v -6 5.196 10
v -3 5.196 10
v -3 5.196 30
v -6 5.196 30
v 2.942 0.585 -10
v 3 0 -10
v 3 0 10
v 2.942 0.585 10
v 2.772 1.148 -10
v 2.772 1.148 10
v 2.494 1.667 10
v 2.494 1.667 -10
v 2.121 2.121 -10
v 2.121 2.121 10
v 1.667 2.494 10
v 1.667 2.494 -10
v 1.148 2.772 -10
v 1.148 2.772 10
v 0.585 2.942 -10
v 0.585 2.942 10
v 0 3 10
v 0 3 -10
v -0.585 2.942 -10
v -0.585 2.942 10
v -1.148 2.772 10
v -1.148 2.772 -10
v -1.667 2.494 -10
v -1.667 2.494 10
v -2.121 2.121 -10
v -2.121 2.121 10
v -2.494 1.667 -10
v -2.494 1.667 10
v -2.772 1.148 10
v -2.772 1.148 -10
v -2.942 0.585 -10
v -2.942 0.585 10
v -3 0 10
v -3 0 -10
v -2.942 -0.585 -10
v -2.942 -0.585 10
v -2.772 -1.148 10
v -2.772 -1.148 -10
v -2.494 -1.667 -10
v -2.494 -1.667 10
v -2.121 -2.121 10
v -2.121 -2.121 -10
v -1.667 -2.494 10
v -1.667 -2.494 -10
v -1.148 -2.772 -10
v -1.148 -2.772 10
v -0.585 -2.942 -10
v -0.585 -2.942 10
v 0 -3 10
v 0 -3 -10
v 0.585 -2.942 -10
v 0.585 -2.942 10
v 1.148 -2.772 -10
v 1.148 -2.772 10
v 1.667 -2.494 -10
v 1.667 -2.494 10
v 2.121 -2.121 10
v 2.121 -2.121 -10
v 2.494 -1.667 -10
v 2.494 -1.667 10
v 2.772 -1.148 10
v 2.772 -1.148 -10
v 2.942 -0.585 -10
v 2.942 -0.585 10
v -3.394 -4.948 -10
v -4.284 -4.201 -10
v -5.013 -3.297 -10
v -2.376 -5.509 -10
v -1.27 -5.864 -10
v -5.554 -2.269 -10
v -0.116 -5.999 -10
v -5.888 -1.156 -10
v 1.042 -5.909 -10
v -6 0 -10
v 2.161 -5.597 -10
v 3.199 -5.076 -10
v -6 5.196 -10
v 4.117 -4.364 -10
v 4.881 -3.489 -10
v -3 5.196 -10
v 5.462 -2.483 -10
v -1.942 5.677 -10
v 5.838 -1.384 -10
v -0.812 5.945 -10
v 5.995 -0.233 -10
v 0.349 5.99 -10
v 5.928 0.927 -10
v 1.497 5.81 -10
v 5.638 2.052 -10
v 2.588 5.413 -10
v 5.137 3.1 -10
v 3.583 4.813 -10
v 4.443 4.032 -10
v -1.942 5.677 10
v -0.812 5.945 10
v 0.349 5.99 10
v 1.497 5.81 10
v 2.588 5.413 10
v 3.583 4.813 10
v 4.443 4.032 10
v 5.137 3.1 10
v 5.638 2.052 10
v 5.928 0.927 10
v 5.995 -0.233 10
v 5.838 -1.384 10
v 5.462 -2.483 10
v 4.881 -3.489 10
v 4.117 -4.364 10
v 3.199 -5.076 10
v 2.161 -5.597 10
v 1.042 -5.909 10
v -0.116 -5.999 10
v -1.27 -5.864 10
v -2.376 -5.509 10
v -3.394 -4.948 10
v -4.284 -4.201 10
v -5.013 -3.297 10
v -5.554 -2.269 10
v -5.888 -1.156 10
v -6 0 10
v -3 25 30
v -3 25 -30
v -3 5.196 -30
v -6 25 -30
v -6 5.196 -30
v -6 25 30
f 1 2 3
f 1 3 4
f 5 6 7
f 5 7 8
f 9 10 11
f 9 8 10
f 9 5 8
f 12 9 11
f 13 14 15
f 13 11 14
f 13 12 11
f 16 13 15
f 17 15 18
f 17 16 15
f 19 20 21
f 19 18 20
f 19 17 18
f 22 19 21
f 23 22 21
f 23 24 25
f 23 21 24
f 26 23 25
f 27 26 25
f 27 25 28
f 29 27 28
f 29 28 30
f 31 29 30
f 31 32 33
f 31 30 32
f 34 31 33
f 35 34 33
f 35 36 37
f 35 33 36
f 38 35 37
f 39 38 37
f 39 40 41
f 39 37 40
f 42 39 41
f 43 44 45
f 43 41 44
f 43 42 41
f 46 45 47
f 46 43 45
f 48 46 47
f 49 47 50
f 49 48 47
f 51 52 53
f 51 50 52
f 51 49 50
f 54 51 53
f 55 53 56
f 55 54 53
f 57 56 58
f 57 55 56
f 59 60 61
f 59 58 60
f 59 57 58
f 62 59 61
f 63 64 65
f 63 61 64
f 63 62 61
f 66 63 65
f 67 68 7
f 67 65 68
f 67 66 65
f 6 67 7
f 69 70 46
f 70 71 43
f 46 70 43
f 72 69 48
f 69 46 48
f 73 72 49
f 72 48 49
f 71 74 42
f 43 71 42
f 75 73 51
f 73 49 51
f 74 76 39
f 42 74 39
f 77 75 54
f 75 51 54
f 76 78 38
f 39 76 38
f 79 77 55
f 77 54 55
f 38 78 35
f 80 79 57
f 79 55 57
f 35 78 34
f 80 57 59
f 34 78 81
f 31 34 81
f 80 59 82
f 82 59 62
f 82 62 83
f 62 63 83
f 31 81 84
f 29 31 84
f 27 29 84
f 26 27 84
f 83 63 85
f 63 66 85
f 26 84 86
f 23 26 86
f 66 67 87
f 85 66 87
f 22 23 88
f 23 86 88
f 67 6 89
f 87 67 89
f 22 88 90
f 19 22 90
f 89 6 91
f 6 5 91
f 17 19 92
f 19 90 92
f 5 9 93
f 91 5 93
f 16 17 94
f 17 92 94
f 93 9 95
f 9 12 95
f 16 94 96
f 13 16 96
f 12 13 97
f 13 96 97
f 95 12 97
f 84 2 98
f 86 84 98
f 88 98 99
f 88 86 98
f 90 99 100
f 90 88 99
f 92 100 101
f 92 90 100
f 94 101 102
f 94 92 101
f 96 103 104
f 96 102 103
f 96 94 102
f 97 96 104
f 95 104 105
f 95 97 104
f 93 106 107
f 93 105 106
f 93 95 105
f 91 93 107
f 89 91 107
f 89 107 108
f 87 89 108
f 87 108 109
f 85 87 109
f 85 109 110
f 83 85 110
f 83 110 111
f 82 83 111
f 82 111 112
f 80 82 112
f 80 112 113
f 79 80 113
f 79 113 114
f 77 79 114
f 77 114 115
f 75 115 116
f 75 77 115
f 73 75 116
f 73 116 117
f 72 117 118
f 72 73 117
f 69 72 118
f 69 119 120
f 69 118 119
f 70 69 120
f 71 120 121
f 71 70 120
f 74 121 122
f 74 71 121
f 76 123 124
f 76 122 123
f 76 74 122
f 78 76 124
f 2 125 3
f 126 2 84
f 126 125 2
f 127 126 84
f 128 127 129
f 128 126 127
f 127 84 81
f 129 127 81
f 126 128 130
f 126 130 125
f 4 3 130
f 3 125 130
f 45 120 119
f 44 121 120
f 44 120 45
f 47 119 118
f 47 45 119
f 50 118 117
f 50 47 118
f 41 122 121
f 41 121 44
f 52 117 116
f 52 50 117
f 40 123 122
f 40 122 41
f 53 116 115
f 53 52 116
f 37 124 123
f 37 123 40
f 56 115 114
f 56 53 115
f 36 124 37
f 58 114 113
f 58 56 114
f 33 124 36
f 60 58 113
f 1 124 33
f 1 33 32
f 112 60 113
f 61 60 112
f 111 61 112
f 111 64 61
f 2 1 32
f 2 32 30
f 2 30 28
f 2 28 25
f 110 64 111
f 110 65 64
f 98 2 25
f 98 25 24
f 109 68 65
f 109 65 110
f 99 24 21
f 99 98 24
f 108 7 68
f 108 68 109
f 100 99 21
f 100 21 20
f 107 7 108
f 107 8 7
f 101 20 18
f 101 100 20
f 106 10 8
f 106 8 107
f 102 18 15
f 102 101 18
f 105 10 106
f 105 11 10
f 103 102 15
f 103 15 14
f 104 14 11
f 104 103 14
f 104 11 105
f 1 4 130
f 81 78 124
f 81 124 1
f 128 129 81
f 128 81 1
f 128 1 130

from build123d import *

# Parameters (mm, degrees)
BOSS_EXTRUDE1_DEPTH      = 30
BOSS_EXTRUDE1_DEPTH_BACK = 30
SKETCH1_R                = 3
CUT_EXTRUDE1_START       = -20
CUT_EXTRUDE1_DEPTH       = 20


with BuildPart() as part:
    # Sketch1 → Boss-Extrude1 (new, two sides: drawn at the far end of the back side and taken through both)
    with BuildSketch(Plane.XY.offset(-BOSS_EXTRUDE1_DEPTH_BACK)):
        with BuildLine():
            Line((-6, 0), (-6, 25))
            Line((-6, 25), (-3, 25))
            Line((-3, 25), (-3, 5.196152423))
            ThreePointArc((-3, 5.196152423), (5.196152423, -3), (-6, 0))
        make_face()
        Circle(SKETCH1_R, mode=Mode.SUBTRACT)
    extrude(amount=BOSS_EXTRUDE1_DEPTH + BOSS_EXTRUDE1_DEPTH_BACK)

    # Sketch2 → Cut-Extrude1 (cut)
    with BuildSketch(Plane.XY.offset(30).offset(CUT_EXTRUDE1_START)):
        with BuildLine():
            Line((-3, 5.196152423), (-6, 5.196152423))
            Line((-6, 5.196152423), (-6, 0))
            ThreePointArc((-6, 0), (5.196152423, -3), (-3, 5.196152423))
        make_face()
    cut_extrude1 = extrude(amount=CUT_EXTRUDE1_DEPTH, mode=Mode.SUBTRACT)

    # Mirror1: Cut-Extrude1 across plane
    add(cut_extrude1.mirror(Plane.XY), mode=Mode.SUBTRACT)


solid = part.part
